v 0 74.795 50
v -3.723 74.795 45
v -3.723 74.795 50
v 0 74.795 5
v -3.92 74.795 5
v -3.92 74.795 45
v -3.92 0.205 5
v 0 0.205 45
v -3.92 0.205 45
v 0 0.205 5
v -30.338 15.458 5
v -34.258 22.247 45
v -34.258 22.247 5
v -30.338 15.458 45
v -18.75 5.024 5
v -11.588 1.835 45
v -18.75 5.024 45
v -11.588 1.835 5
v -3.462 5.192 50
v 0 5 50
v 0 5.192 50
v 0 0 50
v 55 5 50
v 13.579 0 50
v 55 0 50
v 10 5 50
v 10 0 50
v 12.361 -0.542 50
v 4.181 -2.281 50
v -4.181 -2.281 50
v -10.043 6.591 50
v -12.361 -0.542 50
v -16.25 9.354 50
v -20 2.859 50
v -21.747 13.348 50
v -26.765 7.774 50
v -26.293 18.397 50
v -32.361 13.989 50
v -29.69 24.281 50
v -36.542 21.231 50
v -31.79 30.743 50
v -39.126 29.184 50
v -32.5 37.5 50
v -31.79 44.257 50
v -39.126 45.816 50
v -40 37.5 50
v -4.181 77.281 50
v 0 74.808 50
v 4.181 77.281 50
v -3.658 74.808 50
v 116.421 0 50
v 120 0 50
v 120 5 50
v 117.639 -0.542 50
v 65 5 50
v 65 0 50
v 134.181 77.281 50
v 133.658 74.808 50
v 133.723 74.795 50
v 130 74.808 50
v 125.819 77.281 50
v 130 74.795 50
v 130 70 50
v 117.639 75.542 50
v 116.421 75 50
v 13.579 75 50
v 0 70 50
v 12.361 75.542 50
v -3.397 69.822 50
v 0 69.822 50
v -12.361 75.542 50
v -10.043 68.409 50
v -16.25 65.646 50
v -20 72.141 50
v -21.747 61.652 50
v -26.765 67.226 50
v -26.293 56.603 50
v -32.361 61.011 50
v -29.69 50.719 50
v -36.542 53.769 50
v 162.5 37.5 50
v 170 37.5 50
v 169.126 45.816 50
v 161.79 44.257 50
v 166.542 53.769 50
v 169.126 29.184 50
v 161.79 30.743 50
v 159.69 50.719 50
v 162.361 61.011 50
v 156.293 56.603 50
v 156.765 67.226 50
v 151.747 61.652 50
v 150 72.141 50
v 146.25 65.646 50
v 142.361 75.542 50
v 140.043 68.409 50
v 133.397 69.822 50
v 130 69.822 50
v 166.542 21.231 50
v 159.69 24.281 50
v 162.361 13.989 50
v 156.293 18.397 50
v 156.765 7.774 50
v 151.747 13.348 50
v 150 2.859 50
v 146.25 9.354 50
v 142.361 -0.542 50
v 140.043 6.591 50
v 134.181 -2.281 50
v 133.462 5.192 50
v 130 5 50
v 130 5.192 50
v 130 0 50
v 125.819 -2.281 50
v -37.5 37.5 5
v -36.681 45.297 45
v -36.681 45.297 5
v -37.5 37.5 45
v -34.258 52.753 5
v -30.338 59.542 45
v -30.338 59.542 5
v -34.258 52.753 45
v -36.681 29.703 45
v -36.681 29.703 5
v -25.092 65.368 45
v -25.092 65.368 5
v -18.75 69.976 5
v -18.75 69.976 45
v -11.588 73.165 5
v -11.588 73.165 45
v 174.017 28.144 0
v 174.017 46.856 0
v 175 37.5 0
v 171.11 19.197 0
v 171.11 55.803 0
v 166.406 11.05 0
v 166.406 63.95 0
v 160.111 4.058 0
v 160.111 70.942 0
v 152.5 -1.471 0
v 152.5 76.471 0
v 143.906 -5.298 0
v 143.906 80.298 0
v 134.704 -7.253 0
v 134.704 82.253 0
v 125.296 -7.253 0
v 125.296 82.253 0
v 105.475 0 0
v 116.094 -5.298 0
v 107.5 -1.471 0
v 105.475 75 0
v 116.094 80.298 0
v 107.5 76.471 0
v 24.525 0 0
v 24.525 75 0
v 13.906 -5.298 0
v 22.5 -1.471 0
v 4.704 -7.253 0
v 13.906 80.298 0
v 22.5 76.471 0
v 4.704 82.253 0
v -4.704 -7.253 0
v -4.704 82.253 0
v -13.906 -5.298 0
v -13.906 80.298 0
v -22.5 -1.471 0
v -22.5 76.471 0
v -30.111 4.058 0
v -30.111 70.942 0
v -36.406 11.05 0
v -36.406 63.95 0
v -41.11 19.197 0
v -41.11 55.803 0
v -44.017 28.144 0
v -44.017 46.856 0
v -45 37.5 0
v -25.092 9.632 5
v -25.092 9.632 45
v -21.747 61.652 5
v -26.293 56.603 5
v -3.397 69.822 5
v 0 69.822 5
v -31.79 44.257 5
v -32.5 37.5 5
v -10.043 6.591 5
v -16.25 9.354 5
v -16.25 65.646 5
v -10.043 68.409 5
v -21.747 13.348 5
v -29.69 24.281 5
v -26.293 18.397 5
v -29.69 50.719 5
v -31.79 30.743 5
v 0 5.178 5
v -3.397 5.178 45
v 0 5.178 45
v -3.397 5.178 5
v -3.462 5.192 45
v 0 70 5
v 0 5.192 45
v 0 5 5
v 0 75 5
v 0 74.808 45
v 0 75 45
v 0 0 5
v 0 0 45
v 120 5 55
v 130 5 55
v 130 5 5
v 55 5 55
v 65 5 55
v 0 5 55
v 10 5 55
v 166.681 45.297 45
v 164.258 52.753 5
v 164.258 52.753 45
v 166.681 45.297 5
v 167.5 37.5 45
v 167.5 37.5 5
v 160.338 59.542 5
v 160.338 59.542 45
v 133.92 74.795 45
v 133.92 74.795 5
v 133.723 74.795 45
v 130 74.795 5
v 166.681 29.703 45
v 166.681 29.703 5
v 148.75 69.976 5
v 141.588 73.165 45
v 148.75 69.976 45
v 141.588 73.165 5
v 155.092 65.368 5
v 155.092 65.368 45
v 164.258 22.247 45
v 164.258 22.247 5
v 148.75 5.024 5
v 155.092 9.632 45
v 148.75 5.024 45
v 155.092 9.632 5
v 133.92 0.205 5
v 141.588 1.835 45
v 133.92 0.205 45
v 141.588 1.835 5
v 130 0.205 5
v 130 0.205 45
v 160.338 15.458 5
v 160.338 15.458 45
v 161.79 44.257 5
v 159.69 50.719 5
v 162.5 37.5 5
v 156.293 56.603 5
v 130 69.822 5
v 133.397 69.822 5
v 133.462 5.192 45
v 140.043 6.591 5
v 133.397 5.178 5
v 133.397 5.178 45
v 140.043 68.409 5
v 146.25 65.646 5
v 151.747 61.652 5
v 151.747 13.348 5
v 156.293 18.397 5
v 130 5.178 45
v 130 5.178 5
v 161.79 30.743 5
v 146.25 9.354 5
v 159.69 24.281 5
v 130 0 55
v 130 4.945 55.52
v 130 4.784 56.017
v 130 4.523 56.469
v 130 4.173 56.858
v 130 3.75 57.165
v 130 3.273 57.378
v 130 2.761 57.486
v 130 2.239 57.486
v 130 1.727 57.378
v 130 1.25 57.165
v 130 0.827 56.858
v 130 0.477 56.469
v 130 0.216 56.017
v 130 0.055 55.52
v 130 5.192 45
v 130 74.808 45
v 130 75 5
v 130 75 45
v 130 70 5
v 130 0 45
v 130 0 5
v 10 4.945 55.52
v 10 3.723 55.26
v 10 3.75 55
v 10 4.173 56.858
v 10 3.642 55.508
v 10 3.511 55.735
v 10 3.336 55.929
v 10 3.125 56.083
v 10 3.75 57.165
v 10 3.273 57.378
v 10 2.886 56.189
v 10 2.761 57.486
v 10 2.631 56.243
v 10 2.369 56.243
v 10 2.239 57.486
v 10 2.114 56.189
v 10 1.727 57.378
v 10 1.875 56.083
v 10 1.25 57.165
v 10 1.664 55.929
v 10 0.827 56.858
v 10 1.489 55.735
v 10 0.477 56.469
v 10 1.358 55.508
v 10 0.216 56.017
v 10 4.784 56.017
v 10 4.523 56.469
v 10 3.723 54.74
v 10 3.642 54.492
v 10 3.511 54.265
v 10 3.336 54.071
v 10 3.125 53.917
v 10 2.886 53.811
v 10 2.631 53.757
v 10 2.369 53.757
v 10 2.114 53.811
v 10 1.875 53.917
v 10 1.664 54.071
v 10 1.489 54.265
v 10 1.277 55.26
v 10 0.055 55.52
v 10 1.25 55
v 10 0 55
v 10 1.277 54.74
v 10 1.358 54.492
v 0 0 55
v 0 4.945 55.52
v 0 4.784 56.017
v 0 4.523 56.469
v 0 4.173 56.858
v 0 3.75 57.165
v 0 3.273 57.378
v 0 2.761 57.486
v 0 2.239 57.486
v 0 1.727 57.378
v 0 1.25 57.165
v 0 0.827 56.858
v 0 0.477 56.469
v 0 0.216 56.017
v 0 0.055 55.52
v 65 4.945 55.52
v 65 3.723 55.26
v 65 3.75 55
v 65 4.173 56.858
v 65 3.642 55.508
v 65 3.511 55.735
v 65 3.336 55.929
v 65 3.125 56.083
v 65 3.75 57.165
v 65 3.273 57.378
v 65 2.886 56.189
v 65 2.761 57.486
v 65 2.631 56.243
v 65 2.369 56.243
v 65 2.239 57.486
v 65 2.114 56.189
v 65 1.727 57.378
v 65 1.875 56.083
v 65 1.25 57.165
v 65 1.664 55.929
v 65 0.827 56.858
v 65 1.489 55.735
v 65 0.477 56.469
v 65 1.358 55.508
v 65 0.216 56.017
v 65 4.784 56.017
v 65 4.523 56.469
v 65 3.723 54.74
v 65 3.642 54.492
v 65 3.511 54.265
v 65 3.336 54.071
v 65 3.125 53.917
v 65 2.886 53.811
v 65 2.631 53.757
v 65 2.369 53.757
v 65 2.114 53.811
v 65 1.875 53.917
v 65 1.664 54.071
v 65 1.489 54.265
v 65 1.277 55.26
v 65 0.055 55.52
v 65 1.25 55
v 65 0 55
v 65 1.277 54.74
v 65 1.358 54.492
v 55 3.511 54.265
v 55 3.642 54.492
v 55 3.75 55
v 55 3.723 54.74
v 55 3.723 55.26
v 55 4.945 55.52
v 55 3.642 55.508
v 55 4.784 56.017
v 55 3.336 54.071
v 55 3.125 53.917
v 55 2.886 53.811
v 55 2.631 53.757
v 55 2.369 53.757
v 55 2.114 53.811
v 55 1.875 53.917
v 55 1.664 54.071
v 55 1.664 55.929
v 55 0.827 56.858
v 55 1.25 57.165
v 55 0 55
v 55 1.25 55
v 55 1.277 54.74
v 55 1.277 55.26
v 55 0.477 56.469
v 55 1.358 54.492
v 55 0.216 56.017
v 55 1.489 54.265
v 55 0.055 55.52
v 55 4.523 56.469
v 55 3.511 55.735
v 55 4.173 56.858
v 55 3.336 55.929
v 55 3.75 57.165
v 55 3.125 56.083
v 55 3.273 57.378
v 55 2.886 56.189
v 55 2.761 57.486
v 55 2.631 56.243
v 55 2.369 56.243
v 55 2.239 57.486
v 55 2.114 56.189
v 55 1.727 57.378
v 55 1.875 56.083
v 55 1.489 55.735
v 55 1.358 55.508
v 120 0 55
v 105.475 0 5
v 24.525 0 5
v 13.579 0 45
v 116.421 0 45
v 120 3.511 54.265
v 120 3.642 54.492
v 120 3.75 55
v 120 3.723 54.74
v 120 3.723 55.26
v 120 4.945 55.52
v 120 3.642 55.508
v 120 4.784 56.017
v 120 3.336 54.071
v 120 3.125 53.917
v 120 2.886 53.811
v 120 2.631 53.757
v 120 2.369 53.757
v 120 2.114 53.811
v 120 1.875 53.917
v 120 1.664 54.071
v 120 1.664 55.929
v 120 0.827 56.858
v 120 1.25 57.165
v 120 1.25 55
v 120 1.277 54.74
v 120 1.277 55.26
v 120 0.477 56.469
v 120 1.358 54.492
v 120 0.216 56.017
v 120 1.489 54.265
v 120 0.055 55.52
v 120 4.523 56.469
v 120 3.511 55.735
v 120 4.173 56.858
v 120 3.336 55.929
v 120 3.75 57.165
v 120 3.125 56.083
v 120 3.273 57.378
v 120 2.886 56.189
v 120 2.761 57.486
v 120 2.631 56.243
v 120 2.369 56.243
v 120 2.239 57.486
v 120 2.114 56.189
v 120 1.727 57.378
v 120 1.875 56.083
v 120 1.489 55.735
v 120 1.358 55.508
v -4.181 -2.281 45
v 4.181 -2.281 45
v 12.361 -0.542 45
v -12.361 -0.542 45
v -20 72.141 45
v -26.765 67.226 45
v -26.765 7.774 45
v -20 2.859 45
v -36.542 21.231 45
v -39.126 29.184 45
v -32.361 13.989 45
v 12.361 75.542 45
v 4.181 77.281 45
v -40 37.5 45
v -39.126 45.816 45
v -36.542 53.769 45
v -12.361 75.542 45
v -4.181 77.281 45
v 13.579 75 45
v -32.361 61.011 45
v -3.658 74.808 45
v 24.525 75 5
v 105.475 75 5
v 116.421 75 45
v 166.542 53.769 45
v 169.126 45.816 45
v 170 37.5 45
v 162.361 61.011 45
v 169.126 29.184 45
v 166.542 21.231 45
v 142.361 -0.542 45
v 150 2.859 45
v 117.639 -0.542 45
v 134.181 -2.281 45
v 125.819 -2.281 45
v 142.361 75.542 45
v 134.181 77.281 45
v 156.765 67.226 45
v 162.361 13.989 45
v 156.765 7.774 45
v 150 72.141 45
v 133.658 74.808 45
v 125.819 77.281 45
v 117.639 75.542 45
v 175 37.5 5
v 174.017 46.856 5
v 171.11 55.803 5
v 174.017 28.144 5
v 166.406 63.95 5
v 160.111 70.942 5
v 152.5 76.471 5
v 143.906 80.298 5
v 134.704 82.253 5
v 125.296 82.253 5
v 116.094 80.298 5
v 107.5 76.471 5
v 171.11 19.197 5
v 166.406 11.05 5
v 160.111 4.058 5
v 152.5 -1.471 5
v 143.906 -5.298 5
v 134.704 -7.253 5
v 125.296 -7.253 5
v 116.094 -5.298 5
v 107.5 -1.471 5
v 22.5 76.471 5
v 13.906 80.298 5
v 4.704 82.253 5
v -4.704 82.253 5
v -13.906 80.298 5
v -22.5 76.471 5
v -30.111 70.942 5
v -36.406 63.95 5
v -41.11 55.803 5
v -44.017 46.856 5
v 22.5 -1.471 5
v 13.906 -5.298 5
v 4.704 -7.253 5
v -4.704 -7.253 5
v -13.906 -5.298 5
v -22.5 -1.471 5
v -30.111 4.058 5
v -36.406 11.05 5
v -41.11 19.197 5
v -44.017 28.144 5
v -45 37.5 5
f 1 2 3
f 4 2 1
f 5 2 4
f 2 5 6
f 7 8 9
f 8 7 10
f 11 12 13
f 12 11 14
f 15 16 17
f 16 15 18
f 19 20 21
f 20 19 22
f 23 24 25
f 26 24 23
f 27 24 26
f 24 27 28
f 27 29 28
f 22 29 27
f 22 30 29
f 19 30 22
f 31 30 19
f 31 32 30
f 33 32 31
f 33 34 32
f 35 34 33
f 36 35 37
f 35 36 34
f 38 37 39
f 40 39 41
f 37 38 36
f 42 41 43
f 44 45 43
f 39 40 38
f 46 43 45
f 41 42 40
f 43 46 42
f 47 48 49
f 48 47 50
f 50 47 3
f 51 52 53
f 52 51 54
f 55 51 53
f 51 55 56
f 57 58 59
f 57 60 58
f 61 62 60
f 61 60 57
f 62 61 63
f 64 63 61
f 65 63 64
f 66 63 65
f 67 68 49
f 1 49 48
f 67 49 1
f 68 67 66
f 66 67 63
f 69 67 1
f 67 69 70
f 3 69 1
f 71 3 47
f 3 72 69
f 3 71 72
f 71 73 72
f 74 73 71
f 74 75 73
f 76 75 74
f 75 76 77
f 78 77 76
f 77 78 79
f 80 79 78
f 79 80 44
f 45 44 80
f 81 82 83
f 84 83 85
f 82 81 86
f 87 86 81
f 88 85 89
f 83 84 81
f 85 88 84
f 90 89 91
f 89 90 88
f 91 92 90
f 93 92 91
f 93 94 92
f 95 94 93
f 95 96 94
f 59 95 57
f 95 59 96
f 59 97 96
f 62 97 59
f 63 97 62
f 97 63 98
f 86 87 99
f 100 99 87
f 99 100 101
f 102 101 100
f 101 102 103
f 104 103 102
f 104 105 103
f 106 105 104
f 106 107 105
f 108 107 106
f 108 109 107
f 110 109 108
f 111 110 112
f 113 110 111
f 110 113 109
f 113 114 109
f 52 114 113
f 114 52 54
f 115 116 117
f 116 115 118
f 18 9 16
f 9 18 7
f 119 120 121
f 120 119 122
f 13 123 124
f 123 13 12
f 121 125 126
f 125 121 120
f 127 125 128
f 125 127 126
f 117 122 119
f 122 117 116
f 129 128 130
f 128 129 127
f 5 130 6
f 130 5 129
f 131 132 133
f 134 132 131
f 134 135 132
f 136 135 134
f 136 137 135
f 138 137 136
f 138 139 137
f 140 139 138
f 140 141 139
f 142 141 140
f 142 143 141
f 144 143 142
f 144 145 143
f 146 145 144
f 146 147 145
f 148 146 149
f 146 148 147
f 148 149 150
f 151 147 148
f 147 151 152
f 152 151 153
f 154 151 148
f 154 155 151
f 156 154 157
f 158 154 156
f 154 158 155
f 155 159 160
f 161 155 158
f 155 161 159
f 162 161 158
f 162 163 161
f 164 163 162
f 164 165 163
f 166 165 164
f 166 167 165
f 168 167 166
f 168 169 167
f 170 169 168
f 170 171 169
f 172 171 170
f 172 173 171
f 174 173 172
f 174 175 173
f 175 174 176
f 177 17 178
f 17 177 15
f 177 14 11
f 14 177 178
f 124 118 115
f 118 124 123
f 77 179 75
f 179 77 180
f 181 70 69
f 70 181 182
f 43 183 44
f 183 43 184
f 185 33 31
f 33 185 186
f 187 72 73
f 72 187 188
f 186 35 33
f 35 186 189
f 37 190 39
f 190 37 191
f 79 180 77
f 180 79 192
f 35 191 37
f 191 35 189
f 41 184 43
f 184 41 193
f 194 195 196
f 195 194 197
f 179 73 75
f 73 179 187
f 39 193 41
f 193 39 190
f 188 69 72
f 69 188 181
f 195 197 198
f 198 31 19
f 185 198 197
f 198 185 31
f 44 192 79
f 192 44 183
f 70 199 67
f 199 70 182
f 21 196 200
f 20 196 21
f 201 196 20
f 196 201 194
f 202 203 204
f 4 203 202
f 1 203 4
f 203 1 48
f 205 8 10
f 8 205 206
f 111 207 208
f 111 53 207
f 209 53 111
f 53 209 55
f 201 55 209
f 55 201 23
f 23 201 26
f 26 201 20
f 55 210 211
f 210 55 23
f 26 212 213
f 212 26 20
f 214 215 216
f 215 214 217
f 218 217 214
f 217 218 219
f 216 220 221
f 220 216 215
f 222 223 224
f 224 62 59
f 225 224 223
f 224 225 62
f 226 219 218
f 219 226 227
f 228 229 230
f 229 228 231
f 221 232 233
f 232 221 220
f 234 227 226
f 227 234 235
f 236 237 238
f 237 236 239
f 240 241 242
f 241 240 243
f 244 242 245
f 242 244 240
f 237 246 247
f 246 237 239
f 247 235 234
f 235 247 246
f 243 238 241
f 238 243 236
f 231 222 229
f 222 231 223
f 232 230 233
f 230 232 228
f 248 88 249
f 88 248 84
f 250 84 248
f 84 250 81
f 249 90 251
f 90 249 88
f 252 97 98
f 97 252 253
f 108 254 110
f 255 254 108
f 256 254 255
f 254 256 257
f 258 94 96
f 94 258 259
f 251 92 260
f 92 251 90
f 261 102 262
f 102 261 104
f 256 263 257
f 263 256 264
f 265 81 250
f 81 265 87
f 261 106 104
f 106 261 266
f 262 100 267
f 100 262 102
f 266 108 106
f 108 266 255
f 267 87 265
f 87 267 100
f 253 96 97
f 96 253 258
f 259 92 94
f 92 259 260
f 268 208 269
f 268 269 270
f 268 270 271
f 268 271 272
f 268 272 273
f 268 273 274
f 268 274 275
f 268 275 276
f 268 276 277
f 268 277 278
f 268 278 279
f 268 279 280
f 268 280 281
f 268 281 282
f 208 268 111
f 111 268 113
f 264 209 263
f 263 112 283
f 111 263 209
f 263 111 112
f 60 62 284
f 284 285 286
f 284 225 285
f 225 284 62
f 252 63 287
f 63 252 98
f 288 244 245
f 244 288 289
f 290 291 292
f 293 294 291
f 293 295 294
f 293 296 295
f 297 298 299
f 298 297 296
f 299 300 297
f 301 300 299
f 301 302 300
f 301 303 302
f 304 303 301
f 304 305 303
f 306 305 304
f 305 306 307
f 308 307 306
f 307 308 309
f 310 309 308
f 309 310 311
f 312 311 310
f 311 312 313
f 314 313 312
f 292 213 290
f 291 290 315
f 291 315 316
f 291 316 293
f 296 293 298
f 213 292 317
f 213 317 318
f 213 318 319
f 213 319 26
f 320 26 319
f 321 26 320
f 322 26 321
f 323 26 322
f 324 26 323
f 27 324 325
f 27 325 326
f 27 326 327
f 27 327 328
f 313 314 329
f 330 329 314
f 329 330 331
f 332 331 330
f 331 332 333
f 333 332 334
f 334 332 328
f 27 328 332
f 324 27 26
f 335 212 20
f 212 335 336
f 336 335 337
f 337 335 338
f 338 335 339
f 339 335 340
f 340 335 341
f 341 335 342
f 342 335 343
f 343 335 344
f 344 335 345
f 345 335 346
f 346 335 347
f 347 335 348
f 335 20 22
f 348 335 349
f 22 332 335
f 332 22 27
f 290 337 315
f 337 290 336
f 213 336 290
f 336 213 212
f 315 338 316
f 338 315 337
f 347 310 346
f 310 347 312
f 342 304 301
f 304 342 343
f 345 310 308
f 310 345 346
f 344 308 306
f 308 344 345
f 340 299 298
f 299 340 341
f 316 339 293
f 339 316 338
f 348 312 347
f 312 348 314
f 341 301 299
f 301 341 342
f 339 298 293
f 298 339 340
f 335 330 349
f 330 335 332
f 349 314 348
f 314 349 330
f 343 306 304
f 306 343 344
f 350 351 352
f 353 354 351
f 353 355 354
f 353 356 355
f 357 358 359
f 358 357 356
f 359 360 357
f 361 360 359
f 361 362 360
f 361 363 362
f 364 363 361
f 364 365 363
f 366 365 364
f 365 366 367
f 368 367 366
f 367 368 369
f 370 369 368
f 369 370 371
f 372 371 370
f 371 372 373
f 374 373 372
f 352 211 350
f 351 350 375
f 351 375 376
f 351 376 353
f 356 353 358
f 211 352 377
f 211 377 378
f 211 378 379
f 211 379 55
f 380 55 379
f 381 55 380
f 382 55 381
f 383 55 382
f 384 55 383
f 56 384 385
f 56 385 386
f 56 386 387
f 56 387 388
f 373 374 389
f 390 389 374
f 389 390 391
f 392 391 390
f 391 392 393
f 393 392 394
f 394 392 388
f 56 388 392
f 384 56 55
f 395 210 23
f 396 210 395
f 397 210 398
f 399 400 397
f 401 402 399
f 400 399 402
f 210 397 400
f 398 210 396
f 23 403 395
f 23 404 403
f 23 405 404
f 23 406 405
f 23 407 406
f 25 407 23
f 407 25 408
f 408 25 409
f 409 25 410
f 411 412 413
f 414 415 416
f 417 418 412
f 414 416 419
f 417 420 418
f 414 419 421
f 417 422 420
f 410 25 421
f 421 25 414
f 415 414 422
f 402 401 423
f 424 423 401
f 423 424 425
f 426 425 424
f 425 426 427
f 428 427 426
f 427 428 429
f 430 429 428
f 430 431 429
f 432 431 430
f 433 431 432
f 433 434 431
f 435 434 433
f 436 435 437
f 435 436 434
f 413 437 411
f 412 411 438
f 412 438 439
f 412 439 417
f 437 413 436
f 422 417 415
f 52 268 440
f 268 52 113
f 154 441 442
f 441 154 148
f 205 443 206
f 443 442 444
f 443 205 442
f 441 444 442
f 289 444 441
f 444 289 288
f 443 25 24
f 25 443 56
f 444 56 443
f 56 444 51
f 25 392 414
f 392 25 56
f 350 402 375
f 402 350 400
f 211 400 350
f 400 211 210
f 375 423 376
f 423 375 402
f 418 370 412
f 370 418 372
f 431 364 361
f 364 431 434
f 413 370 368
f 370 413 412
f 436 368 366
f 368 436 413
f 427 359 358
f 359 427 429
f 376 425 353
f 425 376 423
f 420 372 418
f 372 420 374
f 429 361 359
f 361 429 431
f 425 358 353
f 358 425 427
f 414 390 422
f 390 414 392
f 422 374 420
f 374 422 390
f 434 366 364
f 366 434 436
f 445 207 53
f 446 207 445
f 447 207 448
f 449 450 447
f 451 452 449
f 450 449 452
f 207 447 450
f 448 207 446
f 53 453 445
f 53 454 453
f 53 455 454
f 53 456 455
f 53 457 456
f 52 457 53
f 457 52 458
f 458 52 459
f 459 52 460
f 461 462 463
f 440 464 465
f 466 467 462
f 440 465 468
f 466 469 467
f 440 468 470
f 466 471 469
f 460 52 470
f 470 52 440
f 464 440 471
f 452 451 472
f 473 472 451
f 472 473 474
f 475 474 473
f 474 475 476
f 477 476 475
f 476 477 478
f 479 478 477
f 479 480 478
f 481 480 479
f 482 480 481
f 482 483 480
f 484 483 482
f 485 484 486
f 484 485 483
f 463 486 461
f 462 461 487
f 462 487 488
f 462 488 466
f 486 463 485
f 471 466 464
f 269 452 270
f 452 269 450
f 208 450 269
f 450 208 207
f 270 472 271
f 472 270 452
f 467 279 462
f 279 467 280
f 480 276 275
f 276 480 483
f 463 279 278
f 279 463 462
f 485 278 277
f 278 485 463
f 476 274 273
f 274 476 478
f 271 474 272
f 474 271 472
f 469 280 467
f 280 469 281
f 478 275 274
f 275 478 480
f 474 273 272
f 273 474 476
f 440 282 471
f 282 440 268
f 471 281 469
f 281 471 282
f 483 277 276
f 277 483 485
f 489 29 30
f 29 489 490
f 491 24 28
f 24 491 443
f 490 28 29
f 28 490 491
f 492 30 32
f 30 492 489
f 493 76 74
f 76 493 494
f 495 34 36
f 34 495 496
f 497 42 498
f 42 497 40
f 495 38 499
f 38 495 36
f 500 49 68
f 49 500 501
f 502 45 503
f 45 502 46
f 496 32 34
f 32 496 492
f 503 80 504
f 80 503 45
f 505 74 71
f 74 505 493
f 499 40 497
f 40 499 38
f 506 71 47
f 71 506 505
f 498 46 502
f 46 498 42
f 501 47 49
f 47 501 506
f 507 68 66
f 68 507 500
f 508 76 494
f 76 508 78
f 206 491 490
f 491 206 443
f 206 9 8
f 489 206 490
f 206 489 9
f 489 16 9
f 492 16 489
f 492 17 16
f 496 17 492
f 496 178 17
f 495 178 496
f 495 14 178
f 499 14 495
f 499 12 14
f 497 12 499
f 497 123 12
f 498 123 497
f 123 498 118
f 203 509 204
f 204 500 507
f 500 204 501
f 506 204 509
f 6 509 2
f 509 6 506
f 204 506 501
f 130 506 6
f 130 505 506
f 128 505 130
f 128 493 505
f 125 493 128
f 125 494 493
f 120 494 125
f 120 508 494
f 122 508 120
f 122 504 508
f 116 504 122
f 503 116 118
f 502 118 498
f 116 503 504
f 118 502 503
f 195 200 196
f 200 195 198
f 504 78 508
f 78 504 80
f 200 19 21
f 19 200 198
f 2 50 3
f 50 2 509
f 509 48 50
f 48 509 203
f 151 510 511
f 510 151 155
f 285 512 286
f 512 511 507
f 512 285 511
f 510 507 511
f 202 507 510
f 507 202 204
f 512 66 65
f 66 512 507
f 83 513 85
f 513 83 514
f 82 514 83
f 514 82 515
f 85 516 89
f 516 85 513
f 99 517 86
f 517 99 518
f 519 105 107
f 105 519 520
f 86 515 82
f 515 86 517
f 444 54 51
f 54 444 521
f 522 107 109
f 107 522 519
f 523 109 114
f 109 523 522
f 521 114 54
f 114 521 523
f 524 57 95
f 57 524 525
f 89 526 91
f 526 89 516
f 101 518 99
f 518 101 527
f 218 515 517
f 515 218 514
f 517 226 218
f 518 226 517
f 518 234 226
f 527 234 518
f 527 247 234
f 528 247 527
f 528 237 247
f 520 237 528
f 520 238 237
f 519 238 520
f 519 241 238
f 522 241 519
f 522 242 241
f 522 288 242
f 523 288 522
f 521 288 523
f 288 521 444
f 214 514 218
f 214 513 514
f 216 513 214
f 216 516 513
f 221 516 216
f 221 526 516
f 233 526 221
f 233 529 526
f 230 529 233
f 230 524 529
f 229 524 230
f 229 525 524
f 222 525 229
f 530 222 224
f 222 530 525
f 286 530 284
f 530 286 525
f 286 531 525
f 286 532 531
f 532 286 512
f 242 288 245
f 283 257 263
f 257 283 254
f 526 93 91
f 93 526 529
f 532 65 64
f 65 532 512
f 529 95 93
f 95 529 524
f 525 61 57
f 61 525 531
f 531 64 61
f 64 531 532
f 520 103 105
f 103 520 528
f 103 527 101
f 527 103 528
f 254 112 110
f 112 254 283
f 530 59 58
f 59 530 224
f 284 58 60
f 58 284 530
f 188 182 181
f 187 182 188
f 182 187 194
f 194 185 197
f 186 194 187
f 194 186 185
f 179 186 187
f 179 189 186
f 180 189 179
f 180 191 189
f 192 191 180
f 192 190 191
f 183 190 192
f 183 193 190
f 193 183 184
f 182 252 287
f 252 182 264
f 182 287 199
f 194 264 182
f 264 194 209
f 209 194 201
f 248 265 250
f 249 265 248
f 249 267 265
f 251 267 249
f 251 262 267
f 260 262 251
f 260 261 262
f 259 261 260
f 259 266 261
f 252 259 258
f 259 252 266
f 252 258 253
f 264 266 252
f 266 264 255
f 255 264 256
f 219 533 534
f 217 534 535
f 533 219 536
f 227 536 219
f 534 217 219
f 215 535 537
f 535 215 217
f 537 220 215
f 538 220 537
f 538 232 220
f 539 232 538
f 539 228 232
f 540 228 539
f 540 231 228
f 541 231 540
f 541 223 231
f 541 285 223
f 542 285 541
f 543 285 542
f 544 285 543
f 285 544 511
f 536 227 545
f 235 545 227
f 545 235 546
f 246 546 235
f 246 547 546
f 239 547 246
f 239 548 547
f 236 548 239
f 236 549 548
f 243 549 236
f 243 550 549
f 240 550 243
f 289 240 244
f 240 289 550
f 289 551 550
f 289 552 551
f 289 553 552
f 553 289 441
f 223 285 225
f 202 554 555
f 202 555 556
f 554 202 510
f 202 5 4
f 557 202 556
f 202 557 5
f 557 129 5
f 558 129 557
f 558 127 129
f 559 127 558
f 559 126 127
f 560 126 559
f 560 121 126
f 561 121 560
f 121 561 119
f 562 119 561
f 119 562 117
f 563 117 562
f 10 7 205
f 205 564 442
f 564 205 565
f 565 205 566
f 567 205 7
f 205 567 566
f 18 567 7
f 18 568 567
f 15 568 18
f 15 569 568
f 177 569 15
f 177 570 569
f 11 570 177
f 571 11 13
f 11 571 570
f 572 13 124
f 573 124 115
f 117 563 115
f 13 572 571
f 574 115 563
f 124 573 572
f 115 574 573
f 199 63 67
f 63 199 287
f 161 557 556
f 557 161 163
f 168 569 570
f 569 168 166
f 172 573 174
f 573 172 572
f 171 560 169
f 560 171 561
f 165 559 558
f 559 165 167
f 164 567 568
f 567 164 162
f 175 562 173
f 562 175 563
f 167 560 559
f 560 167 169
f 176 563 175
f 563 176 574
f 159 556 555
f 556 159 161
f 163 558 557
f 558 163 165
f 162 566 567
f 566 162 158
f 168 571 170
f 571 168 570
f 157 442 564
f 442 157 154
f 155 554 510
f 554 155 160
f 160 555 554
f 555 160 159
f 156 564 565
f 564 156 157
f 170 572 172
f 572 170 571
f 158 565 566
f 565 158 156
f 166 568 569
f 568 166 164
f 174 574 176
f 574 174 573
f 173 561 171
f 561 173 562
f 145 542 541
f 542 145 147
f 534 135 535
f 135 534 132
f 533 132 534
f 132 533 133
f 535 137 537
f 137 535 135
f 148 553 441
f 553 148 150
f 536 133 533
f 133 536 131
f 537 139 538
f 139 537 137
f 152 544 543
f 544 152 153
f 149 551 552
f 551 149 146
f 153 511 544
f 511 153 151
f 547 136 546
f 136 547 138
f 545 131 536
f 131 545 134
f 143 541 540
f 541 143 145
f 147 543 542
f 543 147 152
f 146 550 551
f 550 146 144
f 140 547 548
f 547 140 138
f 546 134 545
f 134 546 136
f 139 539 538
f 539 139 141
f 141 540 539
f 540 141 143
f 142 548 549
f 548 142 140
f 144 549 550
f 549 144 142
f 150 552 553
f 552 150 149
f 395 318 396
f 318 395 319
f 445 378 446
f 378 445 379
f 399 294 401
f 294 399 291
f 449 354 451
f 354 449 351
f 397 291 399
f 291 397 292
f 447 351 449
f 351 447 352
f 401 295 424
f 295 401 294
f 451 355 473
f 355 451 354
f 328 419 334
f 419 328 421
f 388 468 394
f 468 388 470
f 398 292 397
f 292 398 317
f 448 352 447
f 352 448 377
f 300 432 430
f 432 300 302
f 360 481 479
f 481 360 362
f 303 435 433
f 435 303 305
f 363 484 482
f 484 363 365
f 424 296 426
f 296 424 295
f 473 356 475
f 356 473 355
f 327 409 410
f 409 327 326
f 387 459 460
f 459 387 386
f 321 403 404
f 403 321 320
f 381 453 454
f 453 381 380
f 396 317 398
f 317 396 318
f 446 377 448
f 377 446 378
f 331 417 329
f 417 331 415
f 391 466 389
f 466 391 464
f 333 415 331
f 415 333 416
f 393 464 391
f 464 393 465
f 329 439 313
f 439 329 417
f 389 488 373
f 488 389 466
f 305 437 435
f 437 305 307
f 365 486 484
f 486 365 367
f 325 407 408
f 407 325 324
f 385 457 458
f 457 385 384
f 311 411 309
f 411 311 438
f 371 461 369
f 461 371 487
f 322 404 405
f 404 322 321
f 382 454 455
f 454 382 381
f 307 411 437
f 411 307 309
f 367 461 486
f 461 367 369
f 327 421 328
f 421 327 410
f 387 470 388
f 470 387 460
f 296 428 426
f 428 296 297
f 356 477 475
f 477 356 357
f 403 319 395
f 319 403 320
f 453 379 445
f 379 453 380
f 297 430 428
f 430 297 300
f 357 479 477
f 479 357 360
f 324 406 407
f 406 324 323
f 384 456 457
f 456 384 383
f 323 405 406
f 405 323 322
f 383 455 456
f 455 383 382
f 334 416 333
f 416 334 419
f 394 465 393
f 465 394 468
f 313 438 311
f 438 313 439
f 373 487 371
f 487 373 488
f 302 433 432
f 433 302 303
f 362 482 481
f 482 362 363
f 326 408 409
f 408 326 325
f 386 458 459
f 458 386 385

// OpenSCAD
$fn=30;

//The variables hcoffre, lcoffrex,lcoffrey and llamey represent in the same order: 1) the height of the object 2) the lenght of the object 3) the width of the object 4) the thickness of the object. All values can be changed but it is recommended not to change the "llamey" value for the fonctionnality of the object.

hcoffre= 50;
lcoffrex= 130;
llamey= 5;
lcoffrey=70;



module base(){

//the first part represent the base of the object

cube([lcoffrex,lcoffrey,llamey]) ;

translate([0,lcoffrey/2+5,0])cylinder(h=llamey,r=lcoffrey/2+5) ;

translate([lcoffrex,lcoffrey/2+5,0])cylinder(h=llamey,r=lcoffrey/2+5) ;


//the second part represents the sides of the object

cube([lcoffrex,llamey,hcoffre]) ;

translate([0,lcoffrey,0])cube([lcoffrex,llamey,hcoffre]) ;

difference(){translate([0,lcoffrey/2+llamey/2,0])cylinder(h=hcoffre,r=lcoffrey/2+llamey/2);
translate([0,lcoffrey/2+llamey/2,0])cylinder(h=hcoffre,r=lcoffrey/2-llamey/2) ;translate([0,llamey,0])cube([lcoffrex/2,lcoffrey,hcoffre]); }

difference(){translate([lcoffrex,lcoffrey/2+llamey/2,0])cylinder(h=hcoffre,r=lcoffrey/2+llamey/2) ;
translate([lcoffrex,lcoffrey/2+llamey/2,0])cylinder(h=hcoffre,r=lcoffrey/2-llamey/2) ;translate([lcoffrex/2,llamey,0])cube([lcoffrex/2,lcoffrey,hcoffre]); }

//the next part represents the support of the pencil case

union() {translate([0,0,hcoffre])cube([10,llamey,5]) ;

rotate([90,0,90])translate([llamey/2,hcoffre+5,0])cylinder(h=10,r=llamey/2) ;}

translate([lcoffrex/2-10,0,0])union() {translate([0,0,hcoffre])cube([10,llamey,5]) ;

rotate([90,0,90])translate([llamey/2,hcoffre+5,0])cylinder(h=10,r=llamey/2) ;}

translate([lcoffrex-10,0,0])union() {translate([0,0,hcoffre])cube([10,llamey,5]) ;

rotate([90,0,90])translate([llamey/2,hcoffre+5,0])cylinder(h=10,r=llamey/2) ;}


translate([0,lcoffrey/2+llamey/2,0])cylinder(h=llamey,r=lcoffrey/2+10);

translate([lcoffrex,lcoffrey/2+llamey/2,0])cylinder(h=llamey,r=lcoffrey/2+10);

//the last part of the object represent the support for the rotation rod who will put together both parts of the pencil case

difference(){translate([0,lcoffrey/2+llamey/2,hcoffre-llamey])cylinder(h=llamey,r=lcoffrey/2+llamey);
translate([0,lcoffrey/2+5,hcoffre-10])cylinder(h=hcoffre,r=lcoffrey/2) ;translate([0,llamey,hcoffre-10])cube([lcoffrex/2,lcoffrey,hcoffre]); }

difference(){translate([lcoffrex,lcoffrey/2+llamey/2,hcoffre-llamey])cylinder(h=llamey,r=lcoffrey/2+llamey);
translate([lcoffrex,lcoffrey/2+5,hcoffre-10])cylinder(h=hcoffre,r=lcoffrey/2) ;translate([lcoffrex/2,llamey,hcoffre-10])cube([lcoffrex/2,lcoffrey,hcoffre]); }


}
base();

//the module key represent the rotation rod who will put together both parts of the pencil

module key(){
translate([0,llamey/2,hcoffre+5])rotate([90,0,90])cylinder(h=lcoffrex,r=llamey/4);
}
key();
